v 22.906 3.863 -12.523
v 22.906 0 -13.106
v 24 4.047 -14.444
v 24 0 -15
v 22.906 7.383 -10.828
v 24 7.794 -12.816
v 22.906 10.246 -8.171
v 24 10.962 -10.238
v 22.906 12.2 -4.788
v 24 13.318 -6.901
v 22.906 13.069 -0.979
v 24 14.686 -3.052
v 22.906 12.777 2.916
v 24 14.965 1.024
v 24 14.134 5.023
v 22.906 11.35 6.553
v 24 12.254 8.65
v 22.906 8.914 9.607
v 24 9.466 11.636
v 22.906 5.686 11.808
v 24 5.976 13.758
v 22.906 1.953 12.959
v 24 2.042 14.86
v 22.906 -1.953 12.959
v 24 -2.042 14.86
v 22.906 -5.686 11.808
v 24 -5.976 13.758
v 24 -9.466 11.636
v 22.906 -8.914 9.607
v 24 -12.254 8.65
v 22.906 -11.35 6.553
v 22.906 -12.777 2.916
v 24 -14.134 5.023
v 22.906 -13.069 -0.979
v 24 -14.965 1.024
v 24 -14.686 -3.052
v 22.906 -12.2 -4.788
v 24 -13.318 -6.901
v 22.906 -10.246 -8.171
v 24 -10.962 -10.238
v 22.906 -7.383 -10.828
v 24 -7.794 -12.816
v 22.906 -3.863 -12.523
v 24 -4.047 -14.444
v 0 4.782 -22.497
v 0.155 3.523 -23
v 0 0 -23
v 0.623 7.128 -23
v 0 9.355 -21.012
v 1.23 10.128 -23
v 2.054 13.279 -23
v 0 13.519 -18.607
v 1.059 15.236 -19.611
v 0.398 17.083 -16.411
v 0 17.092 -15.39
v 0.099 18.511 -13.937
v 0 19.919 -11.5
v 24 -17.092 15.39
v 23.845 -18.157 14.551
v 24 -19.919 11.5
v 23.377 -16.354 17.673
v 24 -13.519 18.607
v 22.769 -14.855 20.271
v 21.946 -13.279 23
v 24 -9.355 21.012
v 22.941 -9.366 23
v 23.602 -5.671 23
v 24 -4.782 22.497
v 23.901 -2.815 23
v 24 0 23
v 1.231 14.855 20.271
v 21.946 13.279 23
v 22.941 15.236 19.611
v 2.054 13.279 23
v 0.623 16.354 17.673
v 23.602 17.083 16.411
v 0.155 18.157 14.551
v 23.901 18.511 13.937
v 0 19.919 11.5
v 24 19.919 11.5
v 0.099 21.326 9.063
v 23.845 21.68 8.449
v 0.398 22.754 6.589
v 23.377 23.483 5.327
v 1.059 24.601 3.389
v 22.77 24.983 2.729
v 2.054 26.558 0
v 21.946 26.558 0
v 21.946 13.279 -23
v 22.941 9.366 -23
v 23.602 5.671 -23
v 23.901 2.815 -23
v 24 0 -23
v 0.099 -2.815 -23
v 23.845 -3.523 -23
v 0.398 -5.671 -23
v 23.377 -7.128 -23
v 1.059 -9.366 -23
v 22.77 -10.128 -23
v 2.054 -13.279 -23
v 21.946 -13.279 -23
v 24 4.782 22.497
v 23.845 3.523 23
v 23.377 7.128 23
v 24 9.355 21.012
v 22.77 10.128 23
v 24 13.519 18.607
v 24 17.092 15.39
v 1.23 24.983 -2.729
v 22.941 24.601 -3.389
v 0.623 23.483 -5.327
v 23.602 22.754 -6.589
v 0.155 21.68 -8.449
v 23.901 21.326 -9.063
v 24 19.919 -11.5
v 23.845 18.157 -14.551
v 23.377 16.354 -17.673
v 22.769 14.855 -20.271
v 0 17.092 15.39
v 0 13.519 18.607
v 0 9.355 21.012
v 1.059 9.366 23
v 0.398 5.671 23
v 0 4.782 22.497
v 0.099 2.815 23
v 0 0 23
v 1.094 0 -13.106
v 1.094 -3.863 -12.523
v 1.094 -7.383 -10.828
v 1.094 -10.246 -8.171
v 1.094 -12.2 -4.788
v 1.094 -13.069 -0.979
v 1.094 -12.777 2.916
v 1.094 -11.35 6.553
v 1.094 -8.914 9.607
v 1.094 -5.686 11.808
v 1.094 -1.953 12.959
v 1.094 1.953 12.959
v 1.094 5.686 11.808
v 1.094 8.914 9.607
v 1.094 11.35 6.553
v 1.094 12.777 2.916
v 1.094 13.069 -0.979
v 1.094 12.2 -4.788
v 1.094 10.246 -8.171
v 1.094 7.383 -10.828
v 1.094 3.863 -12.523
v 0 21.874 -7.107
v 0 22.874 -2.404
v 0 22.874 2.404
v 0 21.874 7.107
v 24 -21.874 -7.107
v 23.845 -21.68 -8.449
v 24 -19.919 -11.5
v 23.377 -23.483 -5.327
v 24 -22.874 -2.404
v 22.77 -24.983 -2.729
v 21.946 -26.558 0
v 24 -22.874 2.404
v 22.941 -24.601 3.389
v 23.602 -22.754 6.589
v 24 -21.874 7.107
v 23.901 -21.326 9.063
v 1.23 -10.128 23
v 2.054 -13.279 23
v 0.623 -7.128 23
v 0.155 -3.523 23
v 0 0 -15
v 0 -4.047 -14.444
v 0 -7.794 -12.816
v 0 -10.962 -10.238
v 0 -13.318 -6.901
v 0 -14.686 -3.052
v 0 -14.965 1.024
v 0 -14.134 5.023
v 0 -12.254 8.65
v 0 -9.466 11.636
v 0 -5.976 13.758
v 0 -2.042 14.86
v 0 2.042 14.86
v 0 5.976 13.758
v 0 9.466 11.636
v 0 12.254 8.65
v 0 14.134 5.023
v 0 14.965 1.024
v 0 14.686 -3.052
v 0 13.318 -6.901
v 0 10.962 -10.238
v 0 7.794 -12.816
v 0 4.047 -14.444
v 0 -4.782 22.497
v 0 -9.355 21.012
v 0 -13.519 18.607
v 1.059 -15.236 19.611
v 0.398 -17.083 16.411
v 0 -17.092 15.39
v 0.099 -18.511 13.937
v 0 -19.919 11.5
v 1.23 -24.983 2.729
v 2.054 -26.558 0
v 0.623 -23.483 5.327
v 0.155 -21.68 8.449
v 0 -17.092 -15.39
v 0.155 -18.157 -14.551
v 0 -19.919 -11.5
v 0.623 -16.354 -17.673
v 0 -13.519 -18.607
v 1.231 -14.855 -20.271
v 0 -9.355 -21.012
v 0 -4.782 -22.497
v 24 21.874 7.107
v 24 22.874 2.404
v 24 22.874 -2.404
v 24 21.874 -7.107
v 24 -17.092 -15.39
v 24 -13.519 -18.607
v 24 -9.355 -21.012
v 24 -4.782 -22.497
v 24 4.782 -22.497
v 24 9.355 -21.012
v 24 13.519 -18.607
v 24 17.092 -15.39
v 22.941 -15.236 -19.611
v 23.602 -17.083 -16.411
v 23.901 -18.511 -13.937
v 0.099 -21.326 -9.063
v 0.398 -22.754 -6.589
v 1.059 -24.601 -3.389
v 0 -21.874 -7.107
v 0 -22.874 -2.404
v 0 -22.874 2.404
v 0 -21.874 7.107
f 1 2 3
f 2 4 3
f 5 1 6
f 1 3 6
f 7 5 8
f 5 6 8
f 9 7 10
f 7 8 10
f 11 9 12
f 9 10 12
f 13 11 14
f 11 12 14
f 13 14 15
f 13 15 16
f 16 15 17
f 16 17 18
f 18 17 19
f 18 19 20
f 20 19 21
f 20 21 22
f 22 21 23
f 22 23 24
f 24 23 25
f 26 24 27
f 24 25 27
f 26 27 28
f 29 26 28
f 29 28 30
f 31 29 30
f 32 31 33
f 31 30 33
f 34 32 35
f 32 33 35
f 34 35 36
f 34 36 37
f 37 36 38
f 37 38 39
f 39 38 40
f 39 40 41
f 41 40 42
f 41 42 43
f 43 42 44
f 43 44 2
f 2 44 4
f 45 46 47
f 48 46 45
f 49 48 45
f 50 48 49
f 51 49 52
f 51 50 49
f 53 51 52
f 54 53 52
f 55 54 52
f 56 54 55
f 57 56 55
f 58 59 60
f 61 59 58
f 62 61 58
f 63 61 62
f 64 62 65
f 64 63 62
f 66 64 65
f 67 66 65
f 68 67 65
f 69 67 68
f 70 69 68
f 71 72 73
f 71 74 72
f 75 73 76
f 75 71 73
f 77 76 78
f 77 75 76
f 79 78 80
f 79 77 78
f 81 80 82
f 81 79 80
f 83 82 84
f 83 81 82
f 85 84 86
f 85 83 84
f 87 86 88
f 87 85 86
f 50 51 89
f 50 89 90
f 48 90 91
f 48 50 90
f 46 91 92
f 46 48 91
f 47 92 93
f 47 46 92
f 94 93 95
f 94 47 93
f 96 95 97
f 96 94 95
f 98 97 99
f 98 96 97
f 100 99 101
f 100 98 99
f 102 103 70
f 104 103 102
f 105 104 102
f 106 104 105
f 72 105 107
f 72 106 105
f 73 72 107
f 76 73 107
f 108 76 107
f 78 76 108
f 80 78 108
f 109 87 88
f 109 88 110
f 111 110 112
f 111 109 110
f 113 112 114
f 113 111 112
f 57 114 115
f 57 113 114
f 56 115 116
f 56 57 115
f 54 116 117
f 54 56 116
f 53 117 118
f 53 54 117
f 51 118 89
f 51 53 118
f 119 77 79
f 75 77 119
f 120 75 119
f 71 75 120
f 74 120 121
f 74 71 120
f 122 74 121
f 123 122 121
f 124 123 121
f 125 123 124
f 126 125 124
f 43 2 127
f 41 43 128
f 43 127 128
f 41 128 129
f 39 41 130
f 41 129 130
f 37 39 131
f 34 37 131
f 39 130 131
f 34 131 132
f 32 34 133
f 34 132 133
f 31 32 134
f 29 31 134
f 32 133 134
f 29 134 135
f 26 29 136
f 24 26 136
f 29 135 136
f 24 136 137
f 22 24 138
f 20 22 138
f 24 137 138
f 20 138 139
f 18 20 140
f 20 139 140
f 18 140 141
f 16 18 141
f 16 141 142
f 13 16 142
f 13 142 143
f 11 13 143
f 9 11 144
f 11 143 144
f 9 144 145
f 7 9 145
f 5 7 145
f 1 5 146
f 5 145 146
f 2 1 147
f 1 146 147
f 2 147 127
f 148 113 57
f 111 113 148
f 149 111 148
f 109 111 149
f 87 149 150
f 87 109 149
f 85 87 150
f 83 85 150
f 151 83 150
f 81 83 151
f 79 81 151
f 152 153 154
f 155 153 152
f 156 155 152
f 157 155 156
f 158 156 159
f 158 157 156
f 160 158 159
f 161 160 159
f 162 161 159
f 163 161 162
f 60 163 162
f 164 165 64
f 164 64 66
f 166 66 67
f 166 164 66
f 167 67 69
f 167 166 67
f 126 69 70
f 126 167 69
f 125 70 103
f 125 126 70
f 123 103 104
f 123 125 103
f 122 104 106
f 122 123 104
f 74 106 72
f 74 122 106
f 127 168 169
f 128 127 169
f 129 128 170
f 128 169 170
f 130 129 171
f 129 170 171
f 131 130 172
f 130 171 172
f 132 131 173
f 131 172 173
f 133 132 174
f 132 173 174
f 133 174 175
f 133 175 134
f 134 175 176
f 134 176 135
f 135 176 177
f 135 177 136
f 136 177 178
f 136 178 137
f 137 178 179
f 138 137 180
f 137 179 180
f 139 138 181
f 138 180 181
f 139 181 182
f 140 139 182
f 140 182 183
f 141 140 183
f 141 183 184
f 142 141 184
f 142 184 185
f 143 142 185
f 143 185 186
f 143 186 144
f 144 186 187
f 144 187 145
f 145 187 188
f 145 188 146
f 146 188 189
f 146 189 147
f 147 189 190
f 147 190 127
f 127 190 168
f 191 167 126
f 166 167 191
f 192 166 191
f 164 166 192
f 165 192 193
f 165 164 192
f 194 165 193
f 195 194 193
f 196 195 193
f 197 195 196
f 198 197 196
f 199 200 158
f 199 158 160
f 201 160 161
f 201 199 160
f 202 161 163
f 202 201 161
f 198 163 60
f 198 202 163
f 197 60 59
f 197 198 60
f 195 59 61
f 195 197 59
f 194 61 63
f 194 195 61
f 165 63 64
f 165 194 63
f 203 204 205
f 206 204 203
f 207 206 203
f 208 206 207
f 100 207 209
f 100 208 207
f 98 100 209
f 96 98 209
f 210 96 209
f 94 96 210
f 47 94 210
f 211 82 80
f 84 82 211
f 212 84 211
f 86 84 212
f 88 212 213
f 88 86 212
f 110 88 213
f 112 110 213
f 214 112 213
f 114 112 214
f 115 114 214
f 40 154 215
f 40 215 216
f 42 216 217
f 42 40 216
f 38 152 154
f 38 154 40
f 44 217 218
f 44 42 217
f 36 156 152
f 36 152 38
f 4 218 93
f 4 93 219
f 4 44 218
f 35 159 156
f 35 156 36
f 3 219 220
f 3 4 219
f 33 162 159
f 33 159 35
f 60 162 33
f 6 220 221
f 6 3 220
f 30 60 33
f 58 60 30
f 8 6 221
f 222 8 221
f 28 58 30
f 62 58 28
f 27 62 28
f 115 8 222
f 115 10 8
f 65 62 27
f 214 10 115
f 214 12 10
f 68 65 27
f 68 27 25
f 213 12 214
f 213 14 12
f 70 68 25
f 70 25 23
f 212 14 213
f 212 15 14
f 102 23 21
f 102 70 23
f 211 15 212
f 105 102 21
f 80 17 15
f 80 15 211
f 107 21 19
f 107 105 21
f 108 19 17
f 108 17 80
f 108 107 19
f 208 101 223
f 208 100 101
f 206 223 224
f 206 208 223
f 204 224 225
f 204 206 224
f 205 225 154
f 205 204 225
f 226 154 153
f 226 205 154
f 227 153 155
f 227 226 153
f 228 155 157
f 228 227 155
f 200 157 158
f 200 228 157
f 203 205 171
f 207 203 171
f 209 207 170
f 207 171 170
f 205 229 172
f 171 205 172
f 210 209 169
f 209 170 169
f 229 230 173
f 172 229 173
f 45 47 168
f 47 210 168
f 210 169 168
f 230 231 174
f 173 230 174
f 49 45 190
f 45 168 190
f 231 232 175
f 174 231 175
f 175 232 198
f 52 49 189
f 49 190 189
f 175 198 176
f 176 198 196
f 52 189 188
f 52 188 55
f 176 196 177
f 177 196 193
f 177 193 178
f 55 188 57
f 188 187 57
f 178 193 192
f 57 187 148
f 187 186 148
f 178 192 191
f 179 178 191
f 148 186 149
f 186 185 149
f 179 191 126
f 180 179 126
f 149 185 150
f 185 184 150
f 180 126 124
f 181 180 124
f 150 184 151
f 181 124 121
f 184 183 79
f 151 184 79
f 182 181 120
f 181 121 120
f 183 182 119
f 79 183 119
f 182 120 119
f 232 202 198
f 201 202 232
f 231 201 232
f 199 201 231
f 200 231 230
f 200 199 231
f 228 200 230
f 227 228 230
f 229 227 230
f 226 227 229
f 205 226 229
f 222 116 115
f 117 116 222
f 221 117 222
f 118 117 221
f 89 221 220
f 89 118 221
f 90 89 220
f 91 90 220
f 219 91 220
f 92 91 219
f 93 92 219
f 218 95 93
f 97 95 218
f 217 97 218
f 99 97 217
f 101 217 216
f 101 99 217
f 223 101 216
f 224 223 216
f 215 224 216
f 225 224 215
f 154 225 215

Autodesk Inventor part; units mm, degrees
ref_plane "YZ Plane" through (0, 0, 0) normal (1, 0, 0) x (0, 1, 0)
ref_plane "XZ Plane" through (0, 0, 0) normal (0, 1, 0) x (-1, 0, 0)
ref_plane "XY Plane" through (0, 0, 0) normal (0, 0, 1) x (1, 0, 0)
sketch "Sketch1" plane through (0, 0, 0) normal (1, 0, 0) x (0, 1, 0)
  line L0 (-26.5581, 0) -> (-13.2791, 23)
  line L1 (-13.2791, 23) -> (13.2791, 23)
  line L2 (13.2791, 23) -> (26.5581, 0)
  line L3 (26.5581, 0) -> (13.2791, -23)
  line L4 (13.2791, -23) -> (-13.2791, -23)
  line L5 (-13.2791, -23) -> (-26.5581, 0)
  point P0 (0, 0)
  point P1 (0, 0)
  dimension "d0" = 53.1162
extrude "Body" add sketch "Sketch1" along normal blind 24
sketch "Sketch2" plane through (0, 0, 0) normal (0, 0, 1) x (1, 0, 0)
  line L0 (0, 13.2791) -> (0, 26.5581) projected
  line L1 (0, 26.5581) -> (24, 26.5581) projected
  line L2 (24, 13.2791) -> (24, 26.5581) projected
  line L3 (-2.4, 0) -> (31.2, 0) projected
  line L4 (2.0543, 26.5581) -> (0, 23)
  line L5 (21.9457, 26.5581) -> (24, 23)
  dimension "d3" = 30
  dimension "d4" = 30
  dimension "d5" = 46
  dimension "d6" = 46
revolve "Chamfer1" cut sketch "Sketch2" angle 360 about axis through (-10, 0, 0) along (1, 0, 0)
sketch "Sketch3" plane through (24, 0, 0) normal (1, 0, 0) x (0, 0, -1)
  arc A0 (-11.5, -19.9186) -> (11.5, -19.9186) centre (0, 0) ccw projected
hole "Thread" at (24, 0, 0) direction (-1, 0, 0) diameter 26.211 end through all thread size "M30x3.5" class "6H" standard "ISO Metric profile"
chamfer "Chamfer2" distance 1.8944 angle 30 1 edges at (24, 0, 13.1055) measured on face at (24, 19.586, -0.5266)
chamfer "Chamfer3" distance 1.8944 angle 30 1 edges at (0, 0, 13.1055) measured on face at (0, 19.586, -0.5266)
equation "\"d0\" = 1.1547 * SW"
equation "\"d1\" = KOH"
equation "\"d3\" = ANG1"
equation "\"d4\" = ANG2"
equation "\"d5\" = SW0"
equation "\"d6\" = SW01"
equation "\"d8\" = -0.5 * GD1 + 0.5 * NND"
equation "\"d40\" = -0.5 * GD1 + 0.5 * NND"
equation "\"d10\" = -0.5 * GD1 + 0.5 * NND"
equation "\"d41\" = -0.5 * GD1 + 0.5 * NND"
equation "\"ANG1\" = 30deg"
equation "\"ANG2\" = ANG1"
equation "\"KOH\" = 24"
equation "\"SW\" = 46"
equation "\"SW0\" = SW"
equation "\"SW01\" = SW"
equation "\"TOA\" = 30deg"
equation "\"PTC\" = TPU"
equation "\"GAL\" = 0.541266 * TPU"
equation "\"GUL\" = 0.541266 * TPU"
equation "\"TPU\" = 3.5"
equation "\"E0\" = 1.155 * SW"
equation "\"GD1\" = 26.211139"
equation "\"NND\" = 30"
properties part number "BS 3692 - M30"
